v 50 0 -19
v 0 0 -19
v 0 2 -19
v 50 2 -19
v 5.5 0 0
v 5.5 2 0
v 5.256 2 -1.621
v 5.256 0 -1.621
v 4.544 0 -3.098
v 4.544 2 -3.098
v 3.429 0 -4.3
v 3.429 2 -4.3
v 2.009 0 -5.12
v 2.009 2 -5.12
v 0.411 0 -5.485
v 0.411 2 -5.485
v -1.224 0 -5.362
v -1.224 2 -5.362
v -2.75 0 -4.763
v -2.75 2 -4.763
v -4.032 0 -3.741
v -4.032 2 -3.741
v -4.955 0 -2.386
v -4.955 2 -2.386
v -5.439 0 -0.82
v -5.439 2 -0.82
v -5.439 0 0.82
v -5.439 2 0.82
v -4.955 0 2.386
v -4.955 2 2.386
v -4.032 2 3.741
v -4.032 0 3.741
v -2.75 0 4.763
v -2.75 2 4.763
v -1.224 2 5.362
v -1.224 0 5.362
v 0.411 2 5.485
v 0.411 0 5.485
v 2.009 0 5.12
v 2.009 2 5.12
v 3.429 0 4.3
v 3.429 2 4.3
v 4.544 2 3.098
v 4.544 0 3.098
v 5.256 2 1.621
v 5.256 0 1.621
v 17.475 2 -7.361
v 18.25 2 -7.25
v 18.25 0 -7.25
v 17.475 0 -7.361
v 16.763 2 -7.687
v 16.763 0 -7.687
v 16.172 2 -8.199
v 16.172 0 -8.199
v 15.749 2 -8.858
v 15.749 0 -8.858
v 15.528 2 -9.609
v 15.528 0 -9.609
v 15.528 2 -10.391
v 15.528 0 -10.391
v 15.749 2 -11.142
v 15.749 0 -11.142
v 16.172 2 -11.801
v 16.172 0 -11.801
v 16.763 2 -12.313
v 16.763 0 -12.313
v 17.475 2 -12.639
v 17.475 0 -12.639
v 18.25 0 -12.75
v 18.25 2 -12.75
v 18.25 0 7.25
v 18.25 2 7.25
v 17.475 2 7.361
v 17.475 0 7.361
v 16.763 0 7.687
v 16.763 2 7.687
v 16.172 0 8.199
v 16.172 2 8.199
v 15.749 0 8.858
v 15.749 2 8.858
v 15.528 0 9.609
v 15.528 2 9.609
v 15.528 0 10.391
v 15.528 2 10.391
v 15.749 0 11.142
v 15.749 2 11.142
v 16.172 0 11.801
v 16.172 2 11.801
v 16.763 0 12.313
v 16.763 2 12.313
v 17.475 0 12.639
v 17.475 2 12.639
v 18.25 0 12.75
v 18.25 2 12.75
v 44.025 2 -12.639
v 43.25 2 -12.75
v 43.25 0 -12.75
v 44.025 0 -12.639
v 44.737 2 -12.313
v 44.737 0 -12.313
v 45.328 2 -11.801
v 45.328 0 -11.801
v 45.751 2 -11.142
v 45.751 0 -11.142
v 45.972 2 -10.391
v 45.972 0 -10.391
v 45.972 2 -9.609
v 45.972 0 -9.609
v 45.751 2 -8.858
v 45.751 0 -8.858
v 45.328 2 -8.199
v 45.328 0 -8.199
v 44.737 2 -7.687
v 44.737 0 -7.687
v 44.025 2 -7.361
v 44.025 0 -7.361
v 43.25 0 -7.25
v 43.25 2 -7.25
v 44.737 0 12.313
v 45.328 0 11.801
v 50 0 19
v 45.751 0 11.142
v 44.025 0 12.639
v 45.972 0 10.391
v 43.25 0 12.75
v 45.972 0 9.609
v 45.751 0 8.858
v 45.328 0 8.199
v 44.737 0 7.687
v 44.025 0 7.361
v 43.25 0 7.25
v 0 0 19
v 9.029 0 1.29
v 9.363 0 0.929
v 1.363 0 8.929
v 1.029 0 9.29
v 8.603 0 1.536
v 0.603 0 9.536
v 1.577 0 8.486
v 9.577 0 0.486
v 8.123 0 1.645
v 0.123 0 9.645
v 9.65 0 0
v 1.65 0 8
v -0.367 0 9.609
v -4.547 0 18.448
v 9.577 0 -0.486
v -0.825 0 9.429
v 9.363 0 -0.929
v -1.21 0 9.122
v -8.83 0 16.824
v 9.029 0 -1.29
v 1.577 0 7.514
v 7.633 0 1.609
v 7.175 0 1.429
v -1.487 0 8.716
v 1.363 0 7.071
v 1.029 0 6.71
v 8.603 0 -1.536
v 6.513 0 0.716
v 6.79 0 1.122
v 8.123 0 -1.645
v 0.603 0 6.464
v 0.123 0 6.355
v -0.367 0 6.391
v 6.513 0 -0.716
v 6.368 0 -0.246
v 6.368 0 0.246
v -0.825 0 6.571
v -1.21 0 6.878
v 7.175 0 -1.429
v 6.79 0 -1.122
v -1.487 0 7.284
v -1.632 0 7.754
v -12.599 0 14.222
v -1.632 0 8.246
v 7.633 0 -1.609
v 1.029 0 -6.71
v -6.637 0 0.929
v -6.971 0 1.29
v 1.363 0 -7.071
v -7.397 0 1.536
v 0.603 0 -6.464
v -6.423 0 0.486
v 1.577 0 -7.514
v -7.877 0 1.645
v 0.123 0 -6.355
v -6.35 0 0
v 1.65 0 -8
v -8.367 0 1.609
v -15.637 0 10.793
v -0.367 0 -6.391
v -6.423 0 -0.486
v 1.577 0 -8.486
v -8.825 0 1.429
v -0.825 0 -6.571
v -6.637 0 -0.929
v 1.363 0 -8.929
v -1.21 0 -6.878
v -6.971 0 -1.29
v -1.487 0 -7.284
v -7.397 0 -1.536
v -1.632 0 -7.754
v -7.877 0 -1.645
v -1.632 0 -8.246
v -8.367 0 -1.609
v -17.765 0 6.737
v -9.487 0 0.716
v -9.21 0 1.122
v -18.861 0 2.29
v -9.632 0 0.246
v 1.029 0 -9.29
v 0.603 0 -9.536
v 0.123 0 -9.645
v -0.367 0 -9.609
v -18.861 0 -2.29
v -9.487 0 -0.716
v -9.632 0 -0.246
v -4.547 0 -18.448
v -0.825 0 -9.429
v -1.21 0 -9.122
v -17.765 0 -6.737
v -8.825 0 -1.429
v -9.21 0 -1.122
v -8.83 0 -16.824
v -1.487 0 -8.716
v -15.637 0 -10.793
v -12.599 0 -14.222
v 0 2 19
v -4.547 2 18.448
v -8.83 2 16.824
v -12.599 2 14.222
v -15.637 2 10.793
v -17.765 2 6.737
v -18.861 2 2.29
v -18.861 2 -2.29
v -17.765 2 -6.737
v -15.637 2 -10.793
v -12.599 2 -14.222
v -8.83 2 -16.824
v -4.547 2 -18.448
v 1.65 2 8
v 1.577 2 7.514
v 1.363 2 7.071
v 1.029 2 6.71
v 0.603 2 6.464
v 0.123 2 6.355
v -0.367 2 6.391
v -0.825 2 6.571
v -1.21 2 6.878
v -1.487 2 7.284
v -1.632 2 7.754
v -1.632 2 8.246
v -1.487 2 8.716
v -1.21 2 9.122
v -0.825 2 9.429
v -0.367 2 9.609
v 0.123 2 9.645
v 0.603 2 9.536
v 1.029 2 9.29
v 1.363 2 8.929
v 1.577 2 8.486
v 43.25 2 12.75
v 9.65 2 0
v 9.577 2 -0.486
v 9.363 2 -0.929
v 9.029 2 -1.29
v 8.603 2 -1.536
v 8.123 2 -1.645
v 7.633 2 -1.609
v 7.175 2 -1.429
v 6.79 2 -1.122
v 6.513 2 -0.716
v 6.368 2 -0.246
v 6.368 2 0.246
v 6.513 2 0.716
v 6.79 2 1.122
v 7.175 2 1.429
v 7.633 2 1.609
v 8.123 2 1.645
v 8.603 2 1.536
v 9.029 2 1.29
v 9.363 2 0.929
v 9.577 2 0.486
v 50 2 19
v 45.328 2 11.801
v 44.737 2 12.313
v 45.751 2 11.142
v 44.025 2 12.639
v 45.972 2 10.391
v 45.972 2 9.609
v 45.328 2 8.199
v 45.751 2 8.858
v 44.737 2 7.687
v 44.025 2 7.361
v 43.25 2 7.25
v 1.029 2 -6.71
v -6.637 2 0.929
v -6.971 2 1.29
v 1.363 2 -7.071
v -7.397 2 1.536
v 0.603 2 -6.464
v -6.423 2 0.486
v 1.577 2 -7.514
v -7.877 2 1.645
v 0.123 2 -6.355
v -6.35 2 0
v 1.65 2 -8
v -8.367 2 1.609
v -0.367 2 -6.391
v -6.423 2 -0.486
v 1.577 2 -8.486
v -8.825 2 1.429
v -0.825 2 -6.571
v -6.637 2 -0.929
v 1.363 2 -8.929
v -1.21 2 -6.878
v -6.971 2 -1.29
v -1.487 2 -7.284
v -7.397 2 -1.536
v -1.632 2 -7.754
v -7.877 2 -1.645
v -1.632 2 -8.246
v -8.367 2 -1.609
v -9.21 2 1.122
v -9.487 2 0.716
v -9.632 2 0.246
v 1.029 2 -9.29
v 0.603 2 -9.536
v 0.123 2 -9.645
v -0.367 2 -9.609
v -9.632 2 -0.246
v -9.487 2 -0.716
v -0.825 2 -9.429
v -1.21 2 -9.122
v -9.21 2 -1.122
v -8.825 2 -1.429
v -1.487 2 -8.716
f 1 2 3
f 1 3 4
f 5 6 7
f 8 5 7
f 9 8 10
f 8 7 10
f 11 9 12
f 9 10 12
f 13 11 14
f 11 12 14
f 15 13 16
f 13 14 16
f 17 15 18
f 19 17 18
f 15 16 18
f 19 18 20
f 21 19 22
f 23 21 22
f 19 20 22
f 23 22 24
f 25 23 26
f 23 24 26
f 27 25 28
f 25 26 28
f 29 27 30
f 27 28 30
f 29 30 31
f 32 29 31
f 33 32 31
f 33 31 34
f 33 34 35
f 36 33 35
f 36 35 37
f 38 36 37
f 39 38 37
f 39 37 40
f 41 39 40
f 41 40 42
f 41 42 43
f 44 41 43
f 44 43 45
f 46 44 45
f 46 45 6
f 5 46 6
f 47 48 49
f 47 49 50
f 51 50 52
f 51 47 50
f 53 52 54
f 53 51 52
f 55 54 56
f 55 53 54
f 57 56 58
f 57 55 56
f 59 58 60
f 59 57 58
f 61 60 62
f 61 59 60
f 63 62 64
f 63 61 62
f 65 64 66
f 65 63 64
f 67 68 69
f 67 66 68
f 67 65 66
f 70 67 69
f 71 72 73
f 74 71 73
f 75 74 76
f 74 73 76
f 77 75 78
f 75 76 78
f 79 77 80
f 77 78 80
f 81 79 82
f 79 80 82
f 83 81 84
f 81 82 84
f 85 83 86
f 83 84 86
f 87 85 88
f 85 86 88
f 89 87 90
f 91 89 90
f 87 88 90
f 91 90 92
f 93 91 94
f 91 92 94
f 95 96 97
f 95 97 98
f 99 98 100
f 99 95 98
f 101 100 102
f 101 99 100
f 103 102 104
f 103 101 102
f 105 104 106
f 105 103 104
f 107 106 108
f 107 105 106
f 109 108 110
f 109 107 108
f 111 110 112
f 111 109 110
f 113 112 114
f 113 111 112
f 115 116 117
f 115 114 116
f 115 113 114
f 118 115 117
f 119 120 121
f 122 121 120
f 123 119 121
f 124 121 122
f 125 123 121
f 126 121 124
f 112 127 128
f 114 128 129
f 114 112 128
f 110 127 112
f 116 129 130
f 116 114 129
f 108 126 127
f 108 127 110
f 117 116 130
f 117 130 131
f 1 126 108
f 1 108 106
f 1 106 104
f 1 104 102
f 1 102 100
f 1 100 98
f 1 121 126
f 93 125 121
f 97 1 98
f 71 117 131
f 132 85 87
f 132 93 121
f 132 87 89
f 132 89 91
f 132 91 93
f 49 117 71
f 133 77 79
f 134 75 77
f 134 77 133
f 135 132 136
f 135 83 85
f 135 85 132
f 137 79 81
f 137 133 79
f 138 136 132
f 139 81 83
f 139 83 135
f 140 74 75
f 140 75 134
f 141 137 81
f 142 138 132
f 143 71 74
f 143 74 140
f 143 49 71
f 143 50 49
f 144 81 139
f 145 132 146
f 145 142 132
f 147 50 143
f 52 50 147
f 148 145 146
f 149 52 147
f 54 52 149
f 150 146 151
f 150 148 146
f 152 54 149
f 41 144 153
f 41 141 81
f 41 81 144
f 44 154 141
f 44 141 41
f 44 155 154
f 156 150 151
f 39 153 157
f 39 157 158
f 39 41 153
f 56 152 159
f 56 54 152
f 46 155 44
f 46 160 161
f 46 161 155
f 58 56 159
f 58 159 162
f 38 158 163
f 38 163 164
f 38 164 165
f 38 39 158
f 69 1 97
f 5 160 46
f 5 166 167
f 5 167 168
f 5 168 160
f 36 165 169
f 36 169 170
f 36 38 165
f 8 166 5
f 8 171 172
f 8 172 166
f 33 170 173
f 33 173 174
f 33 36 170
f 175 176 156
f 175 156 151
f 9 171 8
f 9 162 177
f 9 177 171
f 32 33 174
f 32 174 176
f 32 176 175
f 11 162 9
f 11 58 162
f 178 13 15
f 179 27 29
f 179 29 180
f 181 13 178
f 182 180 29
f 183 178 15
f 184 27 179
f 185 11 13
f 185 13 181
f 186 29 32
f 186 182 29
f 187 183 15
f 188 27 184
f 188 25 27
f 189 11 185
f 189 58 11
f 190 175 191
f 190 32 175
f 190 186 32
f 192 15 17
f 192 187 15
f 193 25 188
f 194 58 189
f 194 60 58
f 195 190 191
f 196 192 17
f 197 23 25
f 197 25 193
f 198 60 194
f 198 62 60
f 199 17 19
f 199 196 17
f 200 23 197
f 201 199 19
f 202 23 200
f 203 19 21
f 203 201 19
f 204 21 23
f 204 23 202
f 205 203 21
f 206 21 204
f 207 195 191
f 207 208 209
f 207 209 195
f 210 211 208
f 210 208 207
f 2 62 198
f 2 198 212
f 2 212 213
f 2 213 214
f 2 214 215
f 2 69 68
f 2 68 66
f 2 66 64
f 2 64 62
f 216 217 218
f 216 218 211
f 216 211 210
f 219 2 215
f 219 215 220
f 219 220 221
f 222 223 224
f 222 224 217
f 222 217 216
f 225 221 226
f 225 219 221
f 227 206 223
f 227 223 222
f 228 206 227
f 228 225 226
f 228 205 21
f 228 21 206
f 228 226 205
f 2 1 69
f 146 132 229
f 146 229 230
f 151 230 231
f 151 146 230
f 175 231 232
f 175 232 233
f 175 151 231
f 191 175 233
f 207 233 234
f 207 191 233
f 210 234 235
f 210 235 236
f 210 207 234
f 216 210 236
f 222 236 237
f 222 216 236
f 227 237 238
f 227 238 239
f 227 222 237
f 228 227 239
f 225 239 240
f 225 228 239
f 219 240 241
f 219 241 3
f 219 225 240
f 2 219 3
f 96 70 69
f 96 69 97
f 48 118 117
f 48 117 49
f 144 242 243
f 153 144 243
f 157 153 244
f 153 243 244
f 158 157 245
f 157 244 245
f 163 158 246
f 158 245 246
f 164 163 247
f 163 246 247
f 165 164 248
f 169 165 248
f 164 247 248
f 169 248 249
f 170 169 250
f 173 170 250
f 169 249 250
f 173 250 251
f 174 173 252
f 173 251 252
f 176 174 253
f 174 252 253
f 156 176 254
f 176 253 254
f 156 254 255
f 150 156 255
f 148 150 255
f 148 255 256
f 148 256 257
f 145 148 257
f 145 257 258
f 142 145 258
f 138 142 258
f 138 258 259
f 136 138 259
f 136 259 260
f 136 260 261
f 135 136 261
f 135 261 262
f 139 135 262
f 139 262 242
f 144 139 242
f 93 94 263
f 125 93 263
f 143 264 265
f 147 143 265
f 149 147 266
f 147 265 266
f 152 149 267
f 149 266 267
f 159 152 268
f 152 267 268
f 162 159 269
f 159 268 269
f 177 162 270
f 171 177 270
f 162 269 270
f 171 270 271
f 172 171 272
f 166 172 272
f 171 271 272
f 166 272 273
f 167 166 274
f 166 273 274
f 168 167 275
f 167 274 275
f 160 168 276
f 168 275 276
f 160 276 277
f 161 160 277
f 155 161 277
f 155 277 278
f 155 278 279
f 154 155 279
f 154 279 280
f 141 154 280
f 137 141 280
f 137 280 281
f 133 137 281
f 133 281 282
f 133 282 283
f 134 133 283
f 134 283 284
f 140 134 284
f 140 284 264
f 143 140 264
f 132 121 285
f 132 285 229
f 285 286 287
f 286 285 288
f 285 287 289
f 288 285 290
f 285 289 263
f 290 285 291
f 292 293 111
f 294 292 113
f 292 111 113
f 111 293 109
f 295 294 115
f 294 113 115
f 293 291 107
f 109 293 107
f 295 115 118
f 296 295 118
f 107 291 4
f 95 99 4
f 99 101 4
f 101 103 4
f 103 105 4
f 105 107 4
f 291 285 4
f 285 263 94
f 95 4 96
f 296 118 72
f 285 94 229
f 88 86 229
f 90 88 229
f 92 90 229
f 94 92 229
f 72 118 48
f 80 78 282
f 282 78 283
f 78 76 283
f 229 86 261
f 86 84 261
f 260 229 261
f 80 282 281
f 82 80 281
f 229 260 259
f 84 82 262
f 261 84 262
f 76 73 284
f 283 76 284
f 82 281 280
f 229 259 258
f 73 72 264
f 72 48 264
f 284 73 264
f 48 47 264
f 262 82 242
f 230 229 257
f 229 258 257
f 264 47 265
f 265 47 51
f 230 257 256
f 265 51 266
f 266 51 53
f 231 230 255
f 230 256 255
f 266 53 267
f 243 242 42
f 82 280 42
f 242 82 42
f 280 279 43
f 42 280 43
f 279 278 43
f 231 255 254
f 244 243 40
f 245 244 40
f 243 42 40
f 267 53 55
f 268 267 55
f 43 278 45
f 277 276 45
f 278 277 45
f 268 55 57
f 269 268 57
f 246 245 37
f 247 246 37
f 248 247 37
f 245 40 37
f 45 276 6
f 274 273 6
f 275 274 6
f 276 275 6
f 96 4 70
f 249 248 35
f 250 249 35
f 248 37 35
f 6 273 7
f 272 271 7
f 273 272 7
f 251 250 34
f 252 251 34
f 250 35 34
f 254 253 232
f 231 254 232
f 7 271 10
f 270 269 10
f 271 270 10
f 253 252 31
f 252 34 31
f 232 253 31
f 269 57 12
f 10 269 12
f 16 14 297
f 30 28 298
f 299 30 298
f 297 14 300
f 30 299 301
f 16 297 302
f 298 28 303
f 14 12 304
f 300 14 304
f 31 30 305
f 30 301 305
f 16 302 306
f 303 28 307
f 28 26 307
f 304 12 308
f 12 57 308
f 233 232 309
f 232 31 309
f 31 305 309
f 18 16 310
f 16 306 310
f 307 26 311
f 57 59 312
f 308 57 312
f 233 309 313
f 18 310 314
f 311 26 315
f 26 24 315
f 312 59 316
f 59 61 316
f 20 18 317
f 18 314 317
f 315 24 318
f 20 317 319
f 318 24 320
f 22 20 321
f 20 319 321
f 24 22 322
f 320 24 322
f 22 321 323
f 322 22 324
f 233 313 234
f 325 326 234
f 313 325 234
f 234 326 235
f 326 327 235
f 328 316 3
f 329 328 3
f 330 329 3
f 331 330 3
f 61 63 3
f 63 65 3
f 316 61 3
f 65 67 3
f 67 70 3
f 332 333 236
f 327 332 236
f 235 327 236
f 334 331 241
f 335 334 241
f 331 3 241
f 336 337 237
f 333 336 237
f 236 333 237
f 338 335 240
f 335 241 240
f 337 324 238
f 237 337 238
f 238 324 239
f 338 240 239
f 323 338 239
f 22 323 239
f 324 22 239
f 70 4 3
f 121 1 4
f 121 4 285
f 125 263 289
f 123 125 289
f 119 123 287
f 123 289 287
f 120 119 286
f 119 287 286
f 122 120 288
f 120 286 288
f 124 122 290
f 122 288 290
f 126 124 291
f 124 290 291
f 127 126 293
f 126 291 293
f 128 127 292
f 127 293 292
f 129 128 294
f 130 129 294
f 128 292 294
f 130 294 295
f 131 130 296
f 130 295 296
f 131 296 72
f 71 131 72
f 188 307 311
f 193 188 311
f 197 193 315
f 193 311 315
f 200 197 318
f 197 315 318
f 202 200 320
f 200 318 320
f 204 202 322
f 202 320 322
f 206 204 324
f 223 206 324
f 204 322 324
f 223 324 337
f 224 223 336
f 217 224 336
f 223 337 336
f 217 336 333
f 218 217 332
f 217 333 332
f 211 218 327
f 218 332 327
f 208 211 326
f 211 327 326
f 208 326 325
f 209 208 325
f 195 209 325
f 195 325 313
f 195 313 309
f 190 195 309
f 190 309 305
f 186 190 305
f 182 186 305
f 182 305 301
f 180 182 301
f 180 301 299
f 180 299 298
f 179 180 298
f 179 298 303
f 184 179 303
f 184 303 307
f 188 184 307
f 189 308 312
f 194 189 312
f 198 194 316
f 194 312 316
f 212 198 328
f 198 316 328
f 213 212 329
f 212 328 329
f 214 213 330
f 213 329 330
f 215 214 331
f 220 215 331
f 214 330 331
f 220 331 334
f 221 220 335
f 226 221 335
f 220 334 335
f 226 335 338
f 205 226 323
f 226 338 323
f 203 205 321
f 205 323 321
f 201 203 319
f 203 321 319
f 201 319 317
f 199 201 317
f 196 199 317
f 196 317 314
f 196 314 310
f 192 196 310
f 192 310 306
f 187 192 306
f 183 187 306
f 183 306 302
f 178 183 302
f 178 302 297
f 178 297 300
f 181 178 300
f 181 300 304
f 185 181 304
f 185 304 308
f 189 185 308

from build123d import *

# Parameters (mm, degrees)
EXTRUDE_1_DEPTH     = 2
SKETCH_2_R          = 5.5
SKETCH_2_R_2        = 1.65
CUT_EXTRUDE_1_DEPTH = 3


with BuildPart() as part:
    # 草图1 → 凸台-拉伸1 (new body)
    with BuildSketch(Plane(origin=(0, 0, 0), x_dir=(1, 0, 0), z_dir=(0, 1, 0))):
        with BuildLine():
            Line((0, 19), (50, 19))
            Line((50, 19), (50, -19))
            Line((50, -19), (0, -19))
            ThreePointArc((0, -19), (-19, 0), (0, 19))
        make_face()
    extrude(amount=EXTRUDE_1_DEPTH)

    # 草图2 → 切除-拉伸1 (cut, through all)
    with BuildSketch(Plane(origin=(0, 2, 0), x_dir=(1, 0, 0), z_dir=(0, 1, 0))):
        Circle(SKETCH_2_R)
        with Locations((0, -8)):
            Circle(SKETCH_2_R_2)
        with Locations((-8, 0)):
            Circle(SKETCH_2_R_2)
        with Locations((0, 8)):
            Circle(SKETCH_2_R_2)
        with Locations((8, 0)):
            Circle(SKETCH_2_R_2)
        with BuildLine():
            Line((18.25, 12.75), (43.25, 12.75))
            ThreePointArc((43.25, 12.75), (46, 10), (43.25, 7.25))
            Line((43.25, 7.25), (18.25, 7.25))
            ThreePointArc((18.25, 7.25), (15.5, 10), (18.25, 12.75))
        make_face()
        with BuildLine():
            Line((43.25, -7.25), (18.25, -7.25))
            ThreePointArc((18.25, -7.25), (15.5, -10), (18.25, -12.75))
            Line((18.25, -12.75), (43.25, -12.75))
            ThreePointArc((43.25, -12.75), (46, -10), (43.25, -7.25))
        make_face()
    extrude(amount=-CUT_EXTRUDE_1_DEPTH, mode=Mode.SUBTRACT)


solid = part.part
